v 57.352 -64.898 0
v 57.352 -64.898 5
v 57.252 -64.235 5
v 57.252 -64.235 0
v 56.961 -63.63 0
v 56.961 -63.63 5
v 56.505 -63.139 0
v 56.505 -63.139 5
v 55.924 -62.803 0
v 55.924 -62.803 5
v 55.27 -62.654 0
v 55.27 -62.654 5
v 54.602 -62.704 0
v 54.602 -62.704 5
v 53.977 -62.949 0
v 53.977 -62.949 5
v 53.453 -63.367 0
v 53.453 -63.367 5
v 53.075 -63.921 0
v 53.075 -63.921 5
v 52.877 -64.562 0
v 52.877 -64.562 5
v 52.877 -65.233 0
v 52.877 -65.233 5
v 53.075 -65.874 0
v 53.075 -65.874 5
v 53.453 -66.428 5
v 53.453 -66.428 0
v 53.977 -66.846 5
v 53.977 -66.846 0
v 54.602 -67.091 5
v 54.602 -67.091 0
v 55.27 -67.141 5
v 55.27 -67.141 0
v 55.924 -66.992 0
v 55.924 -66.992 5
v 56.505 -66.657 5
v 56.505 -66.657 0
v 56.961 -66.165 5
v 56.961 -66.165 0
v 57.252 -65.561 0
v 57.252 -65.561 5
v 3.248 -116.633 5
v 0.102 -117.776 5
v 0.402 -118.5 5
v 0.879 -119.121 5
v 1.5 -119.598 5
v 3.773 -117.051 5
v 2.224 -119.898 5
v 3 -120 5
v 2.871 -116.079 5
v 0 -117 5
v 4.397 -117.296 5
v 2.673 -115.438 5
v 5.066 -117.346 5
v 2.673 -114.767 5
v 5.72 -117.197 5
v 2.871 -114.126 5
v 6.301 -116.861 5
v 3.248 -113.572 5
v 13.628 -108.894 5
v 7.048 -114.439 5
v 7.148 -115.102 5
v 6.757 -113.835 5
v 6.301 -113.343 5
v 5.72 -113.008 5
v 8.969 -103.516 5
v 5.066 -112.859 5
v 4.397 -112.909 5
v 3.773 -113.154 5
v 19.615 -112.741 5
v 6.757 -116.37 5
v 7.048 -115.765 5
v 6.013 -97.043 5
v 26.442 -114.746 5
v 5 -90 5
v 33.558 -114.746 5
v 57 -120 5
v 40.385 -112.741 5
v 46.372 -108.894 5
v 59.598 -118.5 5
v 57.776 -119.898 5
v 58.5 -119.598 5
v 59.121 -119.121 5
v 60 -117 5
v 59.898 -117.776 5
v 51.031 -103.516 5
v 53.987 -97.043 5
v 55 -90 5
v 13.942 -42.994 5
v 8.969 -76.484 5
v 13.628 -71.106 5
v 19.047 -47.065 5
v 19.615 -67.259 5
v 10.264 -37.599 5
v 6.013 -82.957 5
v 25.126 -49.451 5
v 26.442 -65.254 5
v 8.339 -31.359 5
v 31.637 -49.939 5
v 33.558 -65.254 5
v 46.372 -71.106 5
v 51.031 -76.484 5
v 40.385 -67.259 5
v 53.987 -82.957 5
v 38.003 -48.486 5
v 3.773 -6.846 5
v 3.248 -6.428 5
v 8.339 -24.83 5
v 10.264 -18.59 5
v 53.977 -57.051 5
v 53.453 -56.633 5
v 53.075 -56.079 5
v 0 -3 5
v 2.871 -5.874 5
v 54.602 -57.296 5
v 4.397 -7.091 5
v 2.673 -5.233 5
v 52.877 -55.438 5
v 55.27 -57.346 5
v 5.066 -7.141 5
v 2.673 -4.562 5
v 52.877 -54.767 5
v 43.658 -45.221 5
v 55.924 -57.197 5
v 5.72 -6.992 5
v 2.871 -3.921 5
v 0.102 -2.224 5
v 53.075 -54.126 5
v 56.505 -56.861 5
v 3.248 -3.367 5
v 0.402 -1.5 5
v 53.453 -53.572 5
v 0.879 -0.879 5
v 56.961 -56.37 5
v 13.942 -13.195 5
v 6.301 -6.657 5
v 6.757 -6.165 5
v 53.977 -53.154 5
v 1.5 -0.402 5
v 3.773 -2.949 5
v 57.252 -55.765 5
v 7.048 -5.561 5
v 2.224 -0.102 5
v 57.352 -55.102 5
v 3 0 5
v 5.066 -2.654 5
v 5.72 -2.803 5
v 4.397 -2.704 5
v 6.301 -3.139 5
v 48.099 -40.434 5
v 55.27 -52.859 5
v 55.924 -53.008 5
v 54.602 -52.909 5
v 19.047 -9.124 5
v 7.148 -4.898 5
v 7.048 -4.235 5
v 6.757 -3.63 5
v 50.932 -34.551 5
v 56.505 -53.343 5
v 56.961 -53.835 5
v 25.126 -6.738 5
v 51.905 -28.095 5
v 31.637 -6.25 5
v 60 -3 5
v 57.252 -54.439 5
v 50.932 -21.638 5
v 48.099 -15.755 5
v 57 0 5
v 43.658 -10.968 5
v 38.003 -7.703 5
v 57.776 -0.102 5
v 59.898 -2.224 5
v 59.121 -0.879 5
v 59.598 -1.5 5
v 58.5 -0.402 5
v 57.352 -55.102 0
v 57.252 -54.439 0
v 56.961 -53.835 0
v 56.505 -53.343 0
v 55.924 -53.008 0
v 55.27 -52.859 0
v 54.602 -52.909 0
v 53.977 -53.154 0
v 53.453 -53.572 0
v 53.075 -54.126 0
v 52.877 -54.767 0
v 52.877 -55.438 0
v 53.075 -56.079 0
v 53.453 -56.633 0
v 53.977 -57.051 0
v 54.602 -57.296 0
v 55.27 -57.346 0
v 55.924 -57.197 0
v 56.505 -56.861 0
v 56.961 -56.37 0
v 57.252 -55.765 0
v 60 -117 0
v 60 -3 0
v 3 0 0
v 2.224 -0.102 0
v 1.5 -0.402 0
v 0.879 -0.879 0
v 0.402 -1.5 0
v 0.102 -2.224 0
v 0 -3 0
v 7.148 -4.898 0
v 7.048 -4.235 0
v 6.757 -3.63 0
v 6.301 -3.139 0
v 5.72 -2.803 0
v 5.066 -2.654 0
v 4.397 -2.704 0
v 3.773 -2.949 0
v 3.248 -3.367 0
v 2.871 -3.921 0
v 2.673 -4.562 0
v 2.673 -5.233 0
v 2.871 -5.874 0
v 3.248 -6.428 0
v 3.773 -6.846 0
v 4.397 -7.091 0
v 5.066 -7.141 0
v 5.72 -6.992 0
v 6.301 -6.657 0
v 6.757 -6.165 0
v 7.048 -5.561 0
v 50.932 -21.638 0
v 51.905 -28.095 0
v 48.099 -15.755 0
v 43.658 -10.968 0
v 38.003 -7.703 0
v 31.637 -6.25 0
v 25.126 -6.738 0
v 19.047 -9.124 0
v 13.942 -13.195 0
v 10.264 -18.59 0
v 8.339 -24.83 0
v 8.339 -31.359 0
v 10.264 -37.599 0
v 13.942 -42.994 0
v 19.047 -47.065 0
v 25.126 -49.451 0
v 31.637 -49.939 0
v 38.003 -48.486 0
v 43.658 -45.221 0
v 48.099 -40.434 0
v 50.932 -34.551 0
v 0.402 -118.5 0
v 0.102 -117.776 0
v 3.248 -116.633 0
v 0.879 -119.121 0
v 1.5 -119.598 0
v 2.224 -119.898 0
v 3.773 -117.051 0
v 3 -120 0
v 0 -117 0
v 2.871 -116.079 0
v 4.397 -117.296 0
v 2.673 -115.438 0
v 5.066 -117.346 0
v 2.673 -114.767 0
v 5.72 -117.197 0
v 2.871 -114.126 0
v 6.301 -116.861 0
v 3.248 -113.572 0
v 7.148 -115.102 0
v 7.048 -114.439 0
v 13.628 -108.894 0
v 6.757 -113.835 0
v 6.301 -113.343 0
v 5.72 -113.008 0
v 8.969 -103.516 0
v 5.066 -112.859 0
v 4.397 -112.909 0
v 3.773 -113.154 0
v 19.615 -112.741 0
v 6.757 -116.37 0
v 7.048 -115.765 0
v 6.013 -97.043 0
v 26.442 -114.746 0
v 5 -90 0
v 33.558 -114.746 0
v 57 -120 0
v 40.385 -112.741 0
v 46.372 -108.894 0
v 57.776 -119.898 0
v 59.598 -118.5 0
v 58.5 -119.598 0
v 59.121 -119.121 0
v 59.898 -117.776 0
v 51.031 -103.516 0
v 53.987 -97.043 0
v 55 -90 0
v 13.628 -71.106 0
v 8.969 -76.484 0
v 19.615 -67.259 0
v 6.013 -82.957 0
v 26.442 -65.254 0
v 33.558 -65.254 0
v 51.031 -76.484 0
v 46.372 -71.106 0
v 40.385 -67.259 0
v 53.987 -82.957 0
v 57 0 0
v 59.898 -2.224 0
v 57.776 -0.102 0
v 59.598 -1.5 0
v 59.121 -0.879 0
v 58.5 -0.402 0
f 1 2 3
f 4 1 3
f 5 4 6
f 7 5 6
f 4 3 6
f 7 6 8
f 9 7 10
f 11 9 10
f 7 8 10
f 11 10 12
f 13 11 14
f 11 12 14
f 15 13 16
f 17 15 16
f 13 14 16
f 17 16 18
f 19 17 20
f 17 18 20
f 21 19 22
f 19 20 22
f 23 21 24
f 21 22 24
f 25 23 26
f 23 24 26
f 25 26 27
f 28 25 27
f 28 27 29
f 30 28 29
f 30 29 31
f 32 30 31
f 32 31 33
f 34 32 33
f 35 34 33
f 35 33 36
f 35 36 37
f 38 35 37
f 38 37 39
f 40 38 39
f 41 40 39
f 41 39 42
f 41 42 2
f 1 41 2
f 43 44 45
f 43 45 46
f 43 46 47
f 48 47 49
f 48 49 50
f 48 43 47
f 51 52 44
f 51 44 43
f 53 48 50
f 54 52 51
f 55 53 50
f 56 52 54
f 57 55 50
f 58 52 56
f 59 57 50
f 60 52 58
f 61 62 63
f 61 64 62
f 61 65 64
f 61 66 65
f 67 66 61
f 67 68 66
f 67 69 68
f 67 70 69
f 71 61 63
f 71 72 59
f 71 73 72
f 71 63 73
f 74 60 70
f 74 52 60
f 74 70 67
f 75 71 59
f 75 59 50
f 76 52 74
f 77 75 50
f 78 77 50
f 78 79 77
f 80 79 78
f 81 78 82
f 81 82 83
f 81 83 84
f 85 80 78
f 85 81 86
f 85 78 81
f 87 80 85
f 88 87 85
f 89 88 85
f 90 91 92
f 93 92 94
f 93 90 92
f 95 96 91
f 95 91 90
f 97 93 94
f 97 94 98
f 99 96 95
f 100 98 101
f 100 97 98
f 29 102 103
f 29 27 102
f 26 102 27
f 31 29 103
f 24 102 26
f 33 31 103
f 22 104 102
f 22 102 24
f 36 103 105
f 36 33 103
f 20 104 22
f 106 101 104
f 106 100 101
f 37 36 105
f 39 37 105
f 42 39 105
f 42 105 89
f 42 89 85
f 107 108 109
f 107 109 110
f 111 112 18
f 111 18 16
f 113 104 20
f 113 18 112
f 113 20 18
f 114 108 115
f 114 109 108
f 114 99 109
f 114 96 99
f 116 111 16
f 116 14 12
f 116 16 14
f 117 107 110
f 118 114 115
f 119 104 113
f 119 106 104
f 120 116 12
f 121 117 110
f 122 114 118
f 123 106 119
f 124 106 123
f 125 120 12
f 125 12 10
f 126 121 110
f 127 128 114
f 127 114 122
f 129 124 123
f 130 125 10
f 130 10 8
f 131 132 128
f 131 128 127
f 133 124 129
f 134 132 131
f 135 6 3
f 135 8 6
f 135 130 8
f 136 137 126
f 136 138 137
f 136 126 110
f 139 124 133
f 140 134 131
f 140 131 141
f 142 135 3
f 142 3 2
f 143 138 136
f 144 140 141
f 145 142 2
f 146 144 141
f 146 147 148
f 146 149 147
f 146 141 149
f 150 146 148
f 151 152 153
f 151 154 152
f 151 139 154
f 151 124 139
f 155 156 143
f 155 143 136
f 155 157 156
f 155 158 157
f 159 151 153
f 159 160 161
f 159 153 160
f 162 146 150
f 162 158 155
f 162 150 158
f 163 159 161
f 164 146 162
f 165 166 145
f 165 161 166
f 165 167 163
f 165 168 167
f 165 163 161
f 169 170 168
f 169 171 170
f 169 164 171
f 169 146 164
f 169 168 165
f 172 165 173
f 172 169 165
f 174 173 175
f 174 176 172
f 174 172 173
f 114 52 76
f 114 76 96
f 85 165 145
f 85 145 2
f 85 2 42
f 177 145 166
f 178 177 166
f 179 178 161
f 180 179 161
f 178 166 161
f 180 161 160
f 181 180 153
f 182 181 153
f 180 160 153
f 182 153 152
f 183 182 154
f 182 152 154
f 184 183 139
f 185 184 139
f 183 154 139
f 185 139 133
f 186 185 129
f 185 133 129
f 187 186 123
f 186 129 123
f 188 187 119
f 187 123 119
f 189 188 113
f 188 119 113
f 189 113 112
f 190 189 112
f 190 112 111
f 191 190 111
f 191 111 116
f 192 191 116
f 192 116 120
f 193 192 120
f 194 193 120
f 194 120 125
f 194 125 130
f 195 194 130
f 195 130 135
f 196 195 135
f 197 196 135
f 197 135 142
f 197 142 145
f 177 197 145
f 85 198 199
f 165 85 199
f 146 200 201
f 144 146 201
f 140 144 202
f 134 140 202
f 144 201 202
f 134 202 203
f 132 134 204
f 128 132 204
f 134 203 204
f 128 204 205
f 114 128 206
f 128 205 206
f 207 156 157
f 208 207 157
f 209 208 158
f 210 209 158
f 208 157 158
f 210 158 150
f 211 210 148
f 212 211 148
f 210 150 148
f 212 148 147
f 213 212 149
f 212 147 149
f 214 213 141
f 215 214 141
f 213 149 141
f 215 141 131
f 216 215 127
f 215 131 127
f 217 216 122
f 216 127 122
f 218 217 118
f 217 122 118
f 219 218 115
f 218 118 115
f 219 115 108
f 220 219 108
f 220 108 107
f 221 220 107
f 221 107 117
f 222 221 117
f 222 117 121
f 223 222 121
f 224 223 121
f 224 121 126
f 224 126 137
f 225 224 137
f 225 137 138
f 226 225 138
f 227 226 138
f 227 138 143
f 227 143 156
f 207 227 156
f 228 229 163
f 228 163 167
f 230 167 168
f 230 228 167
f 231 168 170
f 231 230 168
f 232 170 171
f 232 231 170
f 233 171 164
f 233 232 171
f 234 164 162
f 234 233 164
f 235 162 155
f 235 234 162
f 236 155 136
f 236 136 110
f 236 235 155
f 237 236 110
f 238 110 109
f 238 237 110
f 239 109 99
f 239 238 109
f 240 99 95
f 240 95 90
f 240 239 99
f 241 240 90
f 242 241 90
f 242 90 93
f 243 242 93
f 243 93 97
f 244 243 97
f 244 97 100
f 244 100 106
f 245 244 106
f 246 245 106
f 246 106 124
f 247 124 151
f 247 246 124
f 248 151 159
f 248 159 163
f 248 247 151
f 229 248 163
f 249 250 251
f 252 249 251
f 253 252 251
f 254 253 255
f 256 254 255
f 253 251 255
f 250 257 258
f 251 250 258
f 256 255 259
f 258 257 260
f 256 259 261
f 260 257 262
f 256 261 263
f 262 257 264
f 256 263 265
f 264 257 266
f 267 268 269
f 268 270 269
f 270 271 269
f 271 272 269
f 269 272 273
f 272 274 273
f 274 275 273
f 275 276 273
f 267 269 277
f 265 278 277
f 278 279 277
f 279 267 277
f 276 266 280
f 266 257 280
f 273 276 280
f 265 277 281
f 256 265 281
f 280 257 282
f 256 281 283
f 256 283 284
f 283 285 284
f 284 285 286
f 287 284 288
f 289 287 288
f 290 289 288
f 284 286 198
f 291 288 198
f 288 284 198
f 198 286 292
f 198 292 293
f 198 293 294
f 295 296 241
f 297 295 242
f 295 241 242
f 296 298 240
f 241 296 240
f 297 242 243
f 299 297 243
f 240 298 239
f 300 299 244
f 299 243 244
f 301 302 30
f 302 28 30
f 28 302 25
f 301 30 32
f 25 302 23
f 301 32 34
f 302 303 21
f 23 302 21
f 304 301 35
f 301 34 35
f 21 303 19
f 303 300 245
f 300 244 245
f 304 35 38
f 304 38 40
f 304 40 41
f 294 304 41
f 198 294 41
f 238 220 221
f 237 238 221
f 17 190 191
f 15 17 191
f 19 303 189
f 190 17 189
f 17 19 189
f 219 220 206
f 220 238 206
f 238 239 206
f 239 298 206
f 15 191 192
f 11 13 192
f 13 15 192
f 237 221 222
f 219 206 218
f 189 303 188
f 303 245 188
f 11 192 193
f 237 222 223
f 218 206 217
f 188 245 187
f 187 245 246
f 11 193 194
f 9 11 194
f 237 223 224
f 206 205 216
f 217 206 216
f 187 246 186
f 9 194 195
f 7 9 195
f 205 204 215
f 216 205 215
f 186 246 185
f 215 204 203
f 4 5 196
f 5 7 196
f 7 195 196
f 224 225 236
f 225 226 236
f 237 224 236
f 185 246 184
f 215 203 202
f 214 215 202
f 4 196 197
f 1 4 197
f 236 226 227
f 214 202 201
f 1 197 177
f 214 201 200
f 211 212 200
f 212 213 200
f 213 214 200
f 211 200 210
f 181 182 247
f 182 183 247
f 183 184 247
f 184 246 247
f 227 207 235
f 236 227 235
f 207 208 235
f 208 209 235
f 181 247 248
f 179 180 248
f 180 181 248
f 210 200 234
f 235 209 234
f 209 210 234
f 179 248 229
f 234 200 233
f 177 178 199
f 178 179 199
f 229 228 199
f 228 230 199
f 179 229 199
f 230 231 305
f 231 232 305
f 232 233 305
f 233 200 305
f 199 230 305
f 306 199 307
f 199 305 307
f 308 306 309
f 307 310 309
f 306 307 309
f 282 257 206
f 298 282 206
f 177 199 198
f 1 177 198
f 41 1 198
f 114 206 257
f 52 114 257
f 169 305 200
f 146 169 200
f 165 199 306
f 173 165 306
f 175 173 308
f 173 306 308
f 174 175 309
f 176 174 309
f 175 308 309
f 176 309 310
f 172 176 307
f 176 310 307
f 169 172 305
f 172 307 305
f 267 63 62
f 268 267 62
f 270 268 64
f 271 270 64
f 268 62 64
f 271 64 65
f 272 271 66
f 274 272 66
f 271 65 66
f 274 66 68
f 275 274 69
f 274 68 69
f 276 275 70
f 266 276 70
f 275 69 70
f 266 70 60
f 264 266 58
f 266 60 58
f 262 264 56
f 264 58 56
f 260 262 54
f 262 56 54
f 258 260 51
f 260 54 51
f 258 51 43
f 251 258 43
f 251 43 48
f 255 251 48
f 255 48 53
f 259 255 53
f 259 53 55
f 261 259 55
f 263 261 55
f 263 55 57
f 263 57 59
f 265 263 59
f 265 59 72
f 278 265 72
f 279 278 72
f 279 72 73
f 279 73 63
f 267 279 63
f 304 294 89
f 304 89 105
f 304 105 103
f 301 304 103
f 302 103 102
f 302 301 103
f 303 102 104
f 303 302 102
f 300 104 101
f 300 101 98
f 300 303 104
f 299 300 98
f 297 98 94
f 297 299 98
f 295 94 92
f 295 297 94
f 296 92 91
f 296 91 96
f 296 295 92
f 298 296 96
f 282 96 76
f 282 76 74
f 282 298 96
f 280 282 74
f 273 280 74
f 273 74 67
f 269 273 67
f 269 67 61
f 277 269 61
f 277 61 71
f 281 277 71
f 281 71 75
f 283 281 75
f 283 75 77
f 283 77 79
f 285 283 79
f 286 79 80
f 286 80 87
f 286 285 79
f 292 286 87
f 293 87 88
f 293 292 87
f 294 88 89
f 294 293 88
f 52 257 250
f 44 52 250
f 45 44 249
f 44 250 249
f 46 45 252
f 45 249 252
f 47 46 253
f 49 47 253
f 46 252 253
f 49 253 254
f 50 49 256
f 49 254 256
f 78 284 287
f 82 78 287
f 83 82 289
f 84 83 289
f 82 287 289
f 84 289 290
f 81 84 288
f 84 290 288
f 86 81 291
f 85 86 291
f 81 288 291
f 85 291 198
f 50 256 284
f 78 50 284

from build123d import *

# Parameters (mm, degrees)
F0_R     = 25
F0_R_2   = 21.905378
F1_DEPTH = 5
F2_R     = 2.25
F3_DEPTH = 25


with BuildPart() as f1:
    # F0 (on Top) → F1 (new body)
    with BuildSketch(Plane.XY):
        with BuildLine():
            Line((57, 0), (3, 0))
            ThreePointArc((3, 0), (0.87868, -0.87868), (0, -3))
            Line((0, -3), (0, -117))
            ThreePointArc((0, -117), (0.87868, -119.12132), (3, -120))
            Line((3, -120), (57, -120))
            ThreePointArc((57, -120), (59.12132, -119.12132), (60, -117))
            Line((60, -117), (60, -3))
            ThreePointArc((60, -3), (59.12132, -0.87868), (57, 0))
        make_face()
        with Locations((30, -90)):
            Circle(F0_R, mode=Mode.SUBTRACT)
        with Locations((30, -28.094622)):
            Circle(F0_R_2, mode=Mode.SUBTRACT)
    extrude(amount=F1_DEPTH)

    # F2 (on face) → F3 (cut)
    with BuildSketch(Plane.XY.offset(5)):
        with Locations((4.897709, -115.102291)):
            Circle(F2_R)
        with Locations((55.102291, -64.897709)):
            Circle(F2_R)
        with Locations((55.102291, -55.102291)):
            Circle(F2_R)
        with Locations((4.897709, -4.897709)):
            Circle(F2_R)
    extrude(amount=-F3_DEPTH, mode=Mode.SUBTRACT)


solid = f1.part
